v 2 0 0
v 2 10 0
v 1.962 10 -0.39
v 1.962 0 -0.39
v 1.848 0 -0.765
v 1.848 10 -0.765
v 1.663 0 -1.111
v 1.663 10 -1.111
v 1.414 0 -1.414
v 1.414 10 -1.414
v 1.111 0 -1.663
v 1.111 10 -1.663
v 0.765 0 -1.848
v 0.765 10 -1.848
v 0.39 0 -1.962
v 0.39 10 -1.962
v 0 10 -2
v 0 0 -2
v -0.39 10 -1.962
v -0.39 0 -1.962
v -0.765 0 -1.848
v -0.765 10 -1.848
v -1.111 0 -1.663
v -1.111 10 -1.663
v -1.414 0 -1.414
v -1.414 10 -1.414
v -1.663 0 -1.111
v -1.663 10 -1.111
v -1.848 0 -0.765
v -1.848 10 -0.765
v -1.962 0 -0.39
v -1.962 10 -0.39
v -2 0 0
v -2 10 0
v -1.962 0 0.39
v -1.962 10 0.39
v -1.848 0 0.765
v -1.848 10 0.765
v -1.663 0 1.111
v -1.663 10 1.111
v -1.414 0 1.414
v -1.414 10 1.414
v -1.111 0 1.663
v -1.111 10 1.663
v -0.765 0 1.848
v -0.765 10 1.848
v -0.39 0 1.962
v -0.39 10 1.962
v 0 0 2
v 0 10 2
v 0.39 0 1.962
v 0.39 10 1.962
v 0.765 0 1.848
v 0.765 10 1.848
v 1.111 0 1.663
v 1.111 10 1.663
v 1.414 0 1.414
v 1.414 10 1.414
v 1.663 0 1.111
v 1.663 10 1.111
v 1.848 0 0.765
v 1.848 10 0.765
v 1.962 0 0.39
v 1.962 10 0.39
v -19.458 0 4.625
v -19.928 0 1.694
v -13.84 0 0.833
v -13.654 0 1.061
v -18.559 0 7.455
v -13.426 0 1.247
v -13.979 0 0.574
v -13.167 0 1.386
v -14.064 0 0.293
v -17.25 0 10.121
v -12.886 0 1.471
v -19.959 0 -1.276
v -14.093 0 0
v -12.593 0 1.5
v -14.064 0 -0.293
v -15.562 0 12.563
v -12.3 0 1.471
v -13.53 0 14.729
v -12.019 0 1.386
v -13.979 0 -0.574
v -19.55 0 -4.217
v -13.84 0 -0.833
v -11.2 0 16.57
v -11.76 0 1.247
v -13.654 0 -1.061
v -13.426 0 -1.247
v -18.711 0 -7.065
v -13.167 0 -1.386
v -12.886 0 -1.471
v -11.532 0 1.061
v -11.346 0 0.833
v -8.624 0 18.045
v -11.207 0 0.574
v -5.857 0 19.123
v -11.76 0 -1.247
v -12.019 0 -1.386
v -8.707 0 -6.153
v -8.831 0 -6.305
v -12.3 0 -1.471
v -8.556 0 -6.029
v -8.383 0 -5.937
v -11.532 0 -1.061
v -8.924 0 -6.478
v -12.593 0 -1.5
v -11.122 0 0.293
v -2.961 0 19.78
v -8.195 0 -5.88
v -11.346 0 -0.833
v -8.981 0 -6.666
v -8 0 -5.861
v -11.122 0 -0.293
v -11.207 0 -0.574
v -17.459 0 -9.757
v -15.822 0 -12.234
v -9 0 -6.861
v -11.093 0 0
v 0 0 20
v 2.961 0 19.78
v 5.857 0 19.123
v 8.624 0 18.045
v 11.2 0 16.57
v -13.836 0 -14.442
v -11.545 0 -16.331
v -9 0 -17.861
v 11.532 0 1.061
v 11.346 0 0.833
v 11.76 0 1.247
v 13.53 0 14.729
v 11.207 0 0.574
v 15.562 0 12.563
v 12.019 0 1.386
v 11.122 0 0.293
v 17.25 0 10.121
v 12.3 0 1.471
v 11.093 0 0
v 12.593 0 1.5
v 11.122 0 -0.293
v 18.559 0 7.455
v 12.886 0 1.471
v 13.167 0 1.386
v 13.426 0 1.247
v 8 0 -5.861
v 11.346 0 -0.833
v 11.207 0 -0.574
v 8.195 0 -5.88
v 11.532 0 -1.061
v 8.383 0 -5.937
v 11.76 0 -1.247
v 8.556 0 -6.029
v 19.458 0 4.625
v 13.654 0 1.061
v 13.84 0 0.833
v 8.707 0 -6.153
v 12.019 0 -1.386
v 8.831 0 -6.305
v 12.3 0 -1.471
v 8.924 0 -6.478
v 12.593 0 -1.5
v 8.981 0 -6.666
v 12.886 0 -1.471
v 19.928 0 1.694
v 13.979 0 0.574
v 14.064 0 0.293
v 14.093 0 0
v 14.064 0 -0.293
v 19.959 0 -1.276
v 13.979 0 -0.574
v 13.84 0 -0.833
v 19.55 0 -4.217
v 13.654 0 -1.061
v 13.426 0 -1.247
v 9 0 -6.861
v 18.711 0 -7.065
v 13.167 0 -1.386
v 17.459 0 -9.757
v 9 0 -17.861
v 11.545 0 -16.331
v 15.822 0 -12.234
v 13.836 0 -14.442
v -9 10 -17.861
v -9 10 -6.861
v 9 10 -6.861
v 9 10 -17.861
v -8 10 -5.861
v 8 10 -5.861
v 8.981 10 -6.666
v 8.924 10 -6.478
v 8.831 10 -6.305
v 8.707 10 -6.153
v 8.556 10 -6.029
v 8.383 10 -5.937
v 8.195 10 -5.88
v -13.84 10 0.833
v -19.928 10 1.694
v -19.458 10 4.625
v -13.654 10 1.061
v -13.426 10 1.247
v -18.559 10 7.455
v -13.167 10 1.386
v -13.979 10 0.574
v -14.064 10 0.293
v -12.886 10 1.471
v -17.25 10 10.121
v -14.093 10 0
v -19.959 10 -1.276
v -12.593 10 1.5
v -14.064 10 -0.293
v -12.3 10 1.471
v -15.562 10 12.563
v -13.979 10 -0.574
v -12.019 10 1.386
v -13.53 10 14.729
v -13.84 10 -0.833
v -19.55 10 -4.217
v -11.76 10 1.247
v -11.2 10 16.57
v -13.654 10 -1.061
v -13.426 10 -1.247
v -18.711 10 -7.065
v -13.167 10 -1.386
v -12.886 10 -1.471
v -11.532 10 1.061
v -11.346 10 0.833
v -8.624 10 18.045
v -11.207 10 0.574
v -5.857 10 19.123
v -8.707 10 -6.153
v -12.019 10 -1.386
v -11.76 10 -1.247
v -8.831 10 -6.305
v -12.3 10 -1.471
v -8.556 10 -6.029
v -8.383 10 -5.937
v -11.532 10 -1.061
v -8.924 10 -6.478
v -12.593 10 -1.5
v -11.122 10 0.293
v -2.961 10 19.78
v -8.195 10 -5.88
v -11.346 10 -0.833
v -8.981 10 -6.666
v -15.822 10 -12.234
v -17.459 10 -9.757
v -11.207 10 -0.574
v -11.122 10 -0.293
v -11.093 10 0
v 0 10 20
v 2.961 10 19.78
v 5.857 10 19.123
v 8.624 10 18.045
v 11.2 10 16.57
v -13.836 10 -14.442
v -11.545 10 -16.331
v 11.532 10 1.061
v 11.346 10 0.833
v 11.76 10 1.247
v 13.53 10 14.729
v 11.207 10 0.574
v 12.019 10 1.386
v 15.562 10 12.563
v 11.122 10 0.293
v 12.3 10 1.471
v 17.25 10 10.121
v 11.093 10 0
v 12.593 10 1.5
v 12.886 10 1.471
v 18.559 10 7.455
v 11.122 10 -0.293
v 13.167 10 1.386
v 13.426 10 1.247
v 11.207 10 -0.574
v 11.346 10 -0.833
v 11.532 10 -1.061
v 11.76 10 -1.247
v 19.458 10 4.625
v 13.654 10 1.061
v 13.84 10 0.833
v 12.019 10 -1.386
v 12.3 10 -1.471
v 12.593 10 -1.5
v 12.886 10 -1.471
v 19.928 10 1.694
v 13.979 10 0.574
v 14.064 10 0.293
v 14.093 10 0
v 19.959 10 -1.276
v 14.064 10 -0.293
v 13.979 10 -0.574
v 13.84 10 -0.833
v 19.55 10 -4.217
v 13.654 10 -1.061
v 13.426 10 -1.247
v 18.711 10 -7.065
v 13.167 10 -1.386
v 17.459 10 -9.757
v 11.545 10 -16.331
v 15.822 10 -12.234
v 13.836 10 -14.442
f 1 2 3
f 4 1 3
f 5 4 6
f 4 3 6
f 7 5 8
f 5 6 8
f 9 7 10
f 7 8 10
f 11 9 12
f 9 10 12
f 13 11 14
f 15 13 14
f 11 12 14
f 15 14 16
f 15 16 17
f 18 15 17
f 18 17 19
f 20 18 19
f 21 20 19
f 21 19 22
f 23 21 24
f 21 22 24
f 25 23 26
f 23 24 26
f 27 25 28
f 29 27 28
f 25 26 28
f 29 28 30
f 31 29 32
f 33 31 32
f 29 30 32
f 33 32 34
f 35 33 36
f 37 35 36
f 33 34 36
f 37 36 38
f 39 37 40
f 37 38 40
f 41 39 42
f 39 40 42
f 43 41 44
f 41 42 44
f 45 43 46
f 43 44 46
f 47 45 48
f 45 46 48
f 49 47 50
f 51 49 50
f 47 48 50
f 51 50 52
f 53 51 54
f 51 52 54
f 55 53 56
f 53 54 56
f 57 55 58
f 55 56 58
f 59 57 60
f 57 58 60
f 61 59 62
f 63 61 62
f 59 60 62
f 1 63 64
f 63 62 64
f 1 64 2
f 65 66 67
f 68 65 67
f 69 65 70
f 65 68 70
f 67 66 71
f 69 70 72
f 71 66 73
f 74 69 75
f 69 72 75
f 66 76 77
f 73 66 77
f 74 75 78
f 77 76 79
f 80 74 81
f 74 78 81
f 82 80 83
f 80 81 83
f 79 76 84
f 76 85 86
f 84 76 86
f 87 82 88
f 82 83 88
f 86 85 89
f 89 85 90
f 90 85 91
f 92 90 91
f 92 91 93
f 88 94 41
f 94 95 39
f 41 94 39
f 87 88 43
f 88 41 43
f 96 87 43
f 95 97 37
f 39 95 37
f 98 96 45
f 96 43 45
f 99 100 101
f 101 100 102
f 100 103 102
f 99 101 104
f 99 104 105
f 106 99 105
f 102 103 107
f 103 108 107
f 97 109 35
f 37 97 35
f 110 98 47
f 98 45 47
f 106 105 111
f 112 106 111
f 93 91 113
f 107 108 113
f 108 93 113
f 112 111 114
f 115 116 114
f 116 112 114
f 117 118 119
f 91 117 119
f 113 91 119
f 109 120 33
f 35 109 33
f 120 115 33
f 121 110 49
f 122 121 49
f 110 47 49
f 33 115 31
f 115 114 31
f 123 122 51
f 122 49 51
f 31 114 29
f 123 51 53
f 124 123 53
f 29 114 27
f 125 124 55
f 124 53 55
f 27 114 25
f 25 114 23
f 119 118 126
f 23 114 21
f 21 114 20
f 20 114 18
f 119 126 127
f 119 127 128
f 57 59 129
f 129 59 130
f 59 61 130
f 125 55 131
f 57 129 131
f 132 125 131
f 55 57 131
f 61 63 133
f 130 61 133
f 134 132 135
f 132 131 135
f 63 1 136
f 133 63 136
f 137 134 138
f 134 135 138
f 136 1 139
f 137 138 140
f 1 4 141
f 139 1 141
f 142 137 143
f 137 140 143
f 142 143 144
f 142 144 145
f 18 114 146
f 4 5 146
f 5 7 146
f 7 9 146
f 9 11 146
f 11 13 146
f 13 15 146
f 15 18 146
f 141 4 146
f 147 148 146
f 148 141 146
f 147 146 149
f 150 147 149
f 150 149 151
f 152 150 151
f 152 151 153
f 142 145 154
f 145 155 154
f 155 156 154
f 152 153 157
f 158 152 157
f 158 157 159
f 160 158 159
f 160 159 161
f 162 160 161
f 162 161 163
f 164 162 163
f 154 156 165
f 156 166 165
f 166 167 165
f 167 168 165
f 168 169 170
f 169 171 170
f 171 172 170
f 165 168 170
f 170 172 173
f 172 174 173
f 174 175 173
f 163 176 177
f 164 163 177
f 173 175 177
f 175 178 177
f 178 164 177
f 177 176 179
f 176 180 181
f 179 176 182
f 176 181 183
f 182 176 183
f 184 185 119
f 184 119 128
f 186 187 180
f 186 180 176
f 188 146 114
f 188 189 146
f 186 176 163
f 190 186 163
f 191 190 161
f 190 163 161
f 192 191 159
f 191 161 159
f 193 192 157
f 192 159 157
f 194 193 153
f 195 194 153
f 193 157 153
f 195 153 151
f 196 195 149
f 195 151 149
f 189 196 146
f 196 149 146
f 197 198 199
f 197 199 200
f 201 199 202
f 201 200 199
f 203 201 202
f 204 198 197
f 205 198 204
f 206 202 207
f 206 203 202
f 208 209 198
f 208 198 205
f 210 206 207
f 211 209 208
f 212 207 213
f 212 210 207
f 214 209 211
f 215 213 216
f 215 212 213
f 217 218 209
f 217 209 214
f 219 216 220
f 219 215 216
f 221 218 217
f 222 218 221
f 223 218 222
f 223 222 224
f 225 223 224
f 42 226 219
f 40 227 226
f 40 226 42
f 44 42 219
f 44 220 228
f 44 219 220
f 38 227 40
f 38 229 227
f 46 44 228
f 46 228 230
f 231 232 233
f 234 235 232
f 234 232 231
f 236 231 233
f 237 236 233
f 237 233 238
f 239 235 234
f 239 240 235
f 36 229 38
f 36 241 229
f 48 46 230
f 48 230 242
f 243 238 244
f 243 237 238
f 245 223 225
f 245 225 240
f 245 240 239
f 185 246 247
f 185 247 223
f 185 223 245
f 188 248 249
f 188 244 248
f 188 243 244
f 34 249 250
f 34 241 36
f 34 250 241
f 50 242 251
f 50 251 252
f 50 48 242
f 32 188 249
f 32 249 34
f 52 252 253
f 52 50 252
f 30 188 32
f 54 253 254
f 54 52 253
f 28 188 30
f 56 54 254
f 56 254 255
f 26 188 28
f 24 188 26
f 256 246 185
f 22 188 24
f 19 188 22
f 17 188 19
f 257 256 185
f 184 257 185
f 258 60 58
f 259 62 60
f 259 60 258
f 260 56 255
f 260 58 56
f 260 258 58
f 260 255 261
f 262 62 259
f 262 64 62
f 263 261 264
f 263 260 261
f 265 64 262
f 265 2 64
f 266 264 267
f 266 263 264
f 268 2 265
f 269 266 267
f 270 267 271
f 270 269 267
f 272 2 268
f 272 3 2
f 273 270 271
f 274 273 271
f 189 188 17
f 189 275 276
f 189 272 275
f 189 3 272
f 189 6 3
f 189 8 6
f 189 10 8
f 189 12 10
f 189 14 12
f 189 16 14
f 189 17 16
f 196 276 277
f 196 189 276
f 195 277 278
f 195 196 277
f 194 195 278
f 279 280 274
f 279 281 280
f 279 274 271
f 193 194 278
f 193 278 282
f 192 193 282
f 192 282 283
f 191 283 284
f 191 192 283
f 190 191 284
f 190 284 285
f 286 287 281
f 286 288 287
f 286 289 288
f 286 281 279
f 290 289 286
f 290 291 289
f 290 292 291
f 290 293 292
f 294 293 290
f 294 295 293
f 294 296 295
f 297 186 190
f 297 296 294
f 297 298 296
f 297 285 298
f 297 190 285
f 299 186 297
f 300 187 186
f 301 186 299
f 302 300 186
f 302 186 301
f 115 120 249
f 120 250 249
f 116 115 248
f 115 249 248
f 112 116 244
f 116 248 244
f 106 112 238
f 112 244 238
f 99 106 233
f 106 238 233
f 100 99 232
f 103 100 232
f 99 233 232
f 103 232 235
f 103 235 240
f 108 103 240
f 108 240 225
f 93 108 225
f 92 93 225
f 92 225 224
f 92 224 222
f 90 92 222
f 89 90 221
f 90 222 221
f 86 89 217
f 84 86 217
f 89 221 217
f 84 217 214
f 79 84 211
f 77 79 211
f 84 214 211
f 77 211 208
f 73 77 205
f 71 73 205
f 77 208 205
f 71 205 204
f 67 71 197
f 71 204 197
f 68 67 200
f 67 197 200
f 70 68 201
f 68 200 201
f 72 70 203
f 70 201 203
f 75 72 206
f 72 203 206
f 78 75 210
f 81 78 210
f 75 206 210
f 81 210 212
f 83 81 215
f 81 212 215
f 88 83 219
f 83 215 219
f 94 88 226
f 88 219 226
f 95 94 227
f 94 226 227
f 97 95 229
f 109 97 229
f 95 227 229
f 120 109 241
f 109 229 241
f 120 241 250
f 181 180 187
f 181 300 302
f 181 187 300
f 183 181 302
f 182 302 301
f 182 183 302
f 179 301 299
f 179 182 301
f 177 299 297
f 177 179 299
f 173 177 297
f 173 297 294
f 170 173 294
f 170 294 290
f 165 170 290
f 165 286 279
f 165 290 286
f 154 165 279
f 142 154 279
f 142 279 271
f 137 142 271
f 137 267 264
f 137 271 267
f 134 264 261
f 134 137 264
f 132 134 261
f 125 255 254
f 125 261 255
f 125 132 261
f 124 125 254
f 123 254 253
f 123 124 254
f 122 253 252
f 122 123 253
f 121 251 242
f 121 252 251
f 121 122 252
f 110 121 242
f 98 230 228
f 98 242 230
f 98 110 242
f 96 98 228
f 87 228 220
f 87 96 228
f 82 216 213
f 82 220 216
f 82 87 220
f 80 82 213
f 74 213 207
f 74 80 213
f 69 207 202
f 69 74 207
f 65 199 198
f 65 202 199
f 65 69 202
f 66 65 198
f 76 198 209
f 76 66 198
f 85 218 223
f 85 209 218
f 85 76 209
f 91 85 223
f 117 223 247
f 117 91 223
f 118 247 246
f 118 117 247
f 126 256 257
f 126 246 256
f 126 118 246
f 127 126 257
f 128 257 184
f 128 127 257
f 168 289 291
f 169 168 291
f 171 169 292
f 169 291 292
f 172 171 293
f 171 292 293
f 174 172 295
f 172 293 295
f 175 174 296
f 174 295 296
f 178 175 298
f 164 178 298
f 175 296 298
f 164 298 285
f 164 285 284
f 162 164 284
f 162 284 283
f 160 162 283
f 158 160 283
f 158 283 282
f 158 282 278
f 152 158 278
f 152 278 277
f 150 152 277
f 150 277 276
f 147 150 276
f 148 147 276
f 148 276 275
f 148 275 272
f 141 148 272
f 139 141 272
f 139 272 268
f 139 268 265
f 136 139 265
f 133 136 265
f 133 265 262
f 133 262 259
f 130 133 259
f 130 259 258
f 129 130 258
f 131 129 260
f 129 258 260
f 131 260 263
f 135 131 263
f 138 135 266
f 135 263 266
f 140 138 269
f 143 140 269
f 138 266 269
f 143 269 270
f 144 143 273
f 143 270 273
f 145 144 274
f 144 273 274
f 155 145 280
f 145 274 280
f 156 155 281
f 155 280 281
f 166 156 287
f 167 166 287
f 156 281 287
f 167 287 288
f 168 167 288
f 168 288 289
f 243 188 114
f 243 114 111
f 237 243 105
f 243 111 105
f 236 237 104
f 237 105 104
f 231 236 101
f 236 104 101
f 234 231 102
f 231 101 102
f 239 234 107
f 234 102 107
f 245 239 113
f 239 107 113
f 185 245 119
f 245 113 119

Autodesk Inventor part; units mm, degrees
ref_plane "YZ Plane" through (0, 0, 0) normal (1, 0, 0) x (0, 1, 0)
ref_plane "XZ Plane" through (0, 0, 0) normal (0, 1, 0) x (-1, 0, 0)
ref_plane "XY Plane" through (0, 0, 0) normal (0, 0, 1) x (1, 0, 0)
sketch "Sketch1" plane through (0, 0, 0) normal (0, 1, 0) x (-1, 0, 0)
  circle A0 centre (0, 0) radius 20
  dimension "d0" = 40
extrude "Extrusion1" add sketch "Sketch1" along normal blind 10
sketch "Sketch2" plane through (0, 10, 0) normal (0, 1, 0) x (1, 0, 0)
  circle A0 centre (0, 0) radius 20 projected
  circle A1 centre (0, 0) radius 6
  dimension "d3" = 12
extrude "Extrusion2" cut sketch "Sketch2" against normal blind 10 contours A1
sketch "Sketch3" plane through (0, 10, 0) normal (0, 1, 0) x (1, 0, 0)
  circle A0 centre (-12.593, 0) radius 1.5
  circle A1 centre (12.593, 0) radius 1.5
  dimension "d7" = 3
  dimension "d8" = 3
extrude "Extrusion3" cut sketch "Sketch3" against normal blind 10
sketch "Sketch6" plane through (0, 10, 0) normal (0, 1, 0) x (1, 0, 0)
  circle A0 centre (0, 0) radius 6 projected
  circle A1 centre (0, 0) radius 20 projected
  circle A2 centre (0, 0) radius 5
  dimension "d11" = 10
extrude "Extrusion4" add sketch "Sketch6" against normal blind 10 contours A0
sketch "Sketch7" plane through (0, 10, 0) normal (0, 1, 0) x (1, 0, 0)
  circle A0 centre (0, 0) radius 5 projected
  circle A1 centre (0, 0) radius 20 projected
  circle A2 centre (0, 0) radius 3
  dimension "d14" = 6
extrude "Extrusion5" add sketch "Sketch7" against normal blind 2 contours A0
sketch "Sketch8" plane through (0, 10, 0) normal (0, 1, 0) x (1, 0, 0)
  circle A0 centre (0, 0) radius 20 projected
  line L0 (9, 17.8606) -> (9, 7.8606)
  line L1 (9, 7.8606) -> (-9, 7.8606)
  line L2 (-9, 7.8606) -> (-9, 17.8606)
  line L3 (-9, 17.8606) -> (9, 7.8606) construction
  line L4 (9, 17.8606) -> (-9, 7.8606) construction
  arc A1 (9, 17.8606) -> (-9, 17.8606) centre (0, 0) ccw
  point P0 (0, 12.8606)
  dimension "d17" = 18
  dimension "d18" = 10
extrude "Extrusion6" cut sketch "Sketch8" against normal blind 10 contours L0 L1 L2 A0 picked at (0, 11.9071)
sketch "Sketch9" plane through (0, 10, 0) normal (0, 1, 0) x (1, 0, 0)
  line L0 (-9, 7.8606) -> (9, 7.8606)
  line L1 (9, 7.8606) -> (9, 5.8606)
  line L2 (9, 5.8606) -> (-9, 5.8606)
  line L3 (-9, 5.8606) -> (-9, 7.8606)
  dimension "d21" = 18
  dimension "d25" = 2
extrude "Extrusion7" cut sketch "Sketch9" against normal blind 10
sketch "Sketch10" plane through (0, 0, 0) normal (0, -1, 0) x (1, 0, 0)
  circle A0 centre (0, 0) radius 5 projected
extrude "Extrusion8" add sketch "Sketch10" against normal blind 8
sketch "Sketch11" plane through (0, 8, 0) normal (0, 1, 0) x (1, 0, 0)
  circle A0 centre (0, 0) radius 3 projected
extrude "Extrusion9" cut sketch "Sketch11" against normal blind 8
sketch "Sketch12" plane through (0, 10, 0) normal (0, 1, 0) x (1, 0, 0)
  circle A0 centre (0, 0) radius 3 projected
  arc A1 (-9, 17.8606) -> (9, 17.8606) centre (0, 0) ccw projected
  circle A2 centre (0, 0) radius 2
  dimension "d32" = 4
extrude "Extrusion10" add sketch "Sketch12" against normal blind 10
fillet "Fillet1" radius 1 2 edges at (9, 5, -5.8606) (-9, 5, -5.8606)
properties part number "ruka_lozisko"
